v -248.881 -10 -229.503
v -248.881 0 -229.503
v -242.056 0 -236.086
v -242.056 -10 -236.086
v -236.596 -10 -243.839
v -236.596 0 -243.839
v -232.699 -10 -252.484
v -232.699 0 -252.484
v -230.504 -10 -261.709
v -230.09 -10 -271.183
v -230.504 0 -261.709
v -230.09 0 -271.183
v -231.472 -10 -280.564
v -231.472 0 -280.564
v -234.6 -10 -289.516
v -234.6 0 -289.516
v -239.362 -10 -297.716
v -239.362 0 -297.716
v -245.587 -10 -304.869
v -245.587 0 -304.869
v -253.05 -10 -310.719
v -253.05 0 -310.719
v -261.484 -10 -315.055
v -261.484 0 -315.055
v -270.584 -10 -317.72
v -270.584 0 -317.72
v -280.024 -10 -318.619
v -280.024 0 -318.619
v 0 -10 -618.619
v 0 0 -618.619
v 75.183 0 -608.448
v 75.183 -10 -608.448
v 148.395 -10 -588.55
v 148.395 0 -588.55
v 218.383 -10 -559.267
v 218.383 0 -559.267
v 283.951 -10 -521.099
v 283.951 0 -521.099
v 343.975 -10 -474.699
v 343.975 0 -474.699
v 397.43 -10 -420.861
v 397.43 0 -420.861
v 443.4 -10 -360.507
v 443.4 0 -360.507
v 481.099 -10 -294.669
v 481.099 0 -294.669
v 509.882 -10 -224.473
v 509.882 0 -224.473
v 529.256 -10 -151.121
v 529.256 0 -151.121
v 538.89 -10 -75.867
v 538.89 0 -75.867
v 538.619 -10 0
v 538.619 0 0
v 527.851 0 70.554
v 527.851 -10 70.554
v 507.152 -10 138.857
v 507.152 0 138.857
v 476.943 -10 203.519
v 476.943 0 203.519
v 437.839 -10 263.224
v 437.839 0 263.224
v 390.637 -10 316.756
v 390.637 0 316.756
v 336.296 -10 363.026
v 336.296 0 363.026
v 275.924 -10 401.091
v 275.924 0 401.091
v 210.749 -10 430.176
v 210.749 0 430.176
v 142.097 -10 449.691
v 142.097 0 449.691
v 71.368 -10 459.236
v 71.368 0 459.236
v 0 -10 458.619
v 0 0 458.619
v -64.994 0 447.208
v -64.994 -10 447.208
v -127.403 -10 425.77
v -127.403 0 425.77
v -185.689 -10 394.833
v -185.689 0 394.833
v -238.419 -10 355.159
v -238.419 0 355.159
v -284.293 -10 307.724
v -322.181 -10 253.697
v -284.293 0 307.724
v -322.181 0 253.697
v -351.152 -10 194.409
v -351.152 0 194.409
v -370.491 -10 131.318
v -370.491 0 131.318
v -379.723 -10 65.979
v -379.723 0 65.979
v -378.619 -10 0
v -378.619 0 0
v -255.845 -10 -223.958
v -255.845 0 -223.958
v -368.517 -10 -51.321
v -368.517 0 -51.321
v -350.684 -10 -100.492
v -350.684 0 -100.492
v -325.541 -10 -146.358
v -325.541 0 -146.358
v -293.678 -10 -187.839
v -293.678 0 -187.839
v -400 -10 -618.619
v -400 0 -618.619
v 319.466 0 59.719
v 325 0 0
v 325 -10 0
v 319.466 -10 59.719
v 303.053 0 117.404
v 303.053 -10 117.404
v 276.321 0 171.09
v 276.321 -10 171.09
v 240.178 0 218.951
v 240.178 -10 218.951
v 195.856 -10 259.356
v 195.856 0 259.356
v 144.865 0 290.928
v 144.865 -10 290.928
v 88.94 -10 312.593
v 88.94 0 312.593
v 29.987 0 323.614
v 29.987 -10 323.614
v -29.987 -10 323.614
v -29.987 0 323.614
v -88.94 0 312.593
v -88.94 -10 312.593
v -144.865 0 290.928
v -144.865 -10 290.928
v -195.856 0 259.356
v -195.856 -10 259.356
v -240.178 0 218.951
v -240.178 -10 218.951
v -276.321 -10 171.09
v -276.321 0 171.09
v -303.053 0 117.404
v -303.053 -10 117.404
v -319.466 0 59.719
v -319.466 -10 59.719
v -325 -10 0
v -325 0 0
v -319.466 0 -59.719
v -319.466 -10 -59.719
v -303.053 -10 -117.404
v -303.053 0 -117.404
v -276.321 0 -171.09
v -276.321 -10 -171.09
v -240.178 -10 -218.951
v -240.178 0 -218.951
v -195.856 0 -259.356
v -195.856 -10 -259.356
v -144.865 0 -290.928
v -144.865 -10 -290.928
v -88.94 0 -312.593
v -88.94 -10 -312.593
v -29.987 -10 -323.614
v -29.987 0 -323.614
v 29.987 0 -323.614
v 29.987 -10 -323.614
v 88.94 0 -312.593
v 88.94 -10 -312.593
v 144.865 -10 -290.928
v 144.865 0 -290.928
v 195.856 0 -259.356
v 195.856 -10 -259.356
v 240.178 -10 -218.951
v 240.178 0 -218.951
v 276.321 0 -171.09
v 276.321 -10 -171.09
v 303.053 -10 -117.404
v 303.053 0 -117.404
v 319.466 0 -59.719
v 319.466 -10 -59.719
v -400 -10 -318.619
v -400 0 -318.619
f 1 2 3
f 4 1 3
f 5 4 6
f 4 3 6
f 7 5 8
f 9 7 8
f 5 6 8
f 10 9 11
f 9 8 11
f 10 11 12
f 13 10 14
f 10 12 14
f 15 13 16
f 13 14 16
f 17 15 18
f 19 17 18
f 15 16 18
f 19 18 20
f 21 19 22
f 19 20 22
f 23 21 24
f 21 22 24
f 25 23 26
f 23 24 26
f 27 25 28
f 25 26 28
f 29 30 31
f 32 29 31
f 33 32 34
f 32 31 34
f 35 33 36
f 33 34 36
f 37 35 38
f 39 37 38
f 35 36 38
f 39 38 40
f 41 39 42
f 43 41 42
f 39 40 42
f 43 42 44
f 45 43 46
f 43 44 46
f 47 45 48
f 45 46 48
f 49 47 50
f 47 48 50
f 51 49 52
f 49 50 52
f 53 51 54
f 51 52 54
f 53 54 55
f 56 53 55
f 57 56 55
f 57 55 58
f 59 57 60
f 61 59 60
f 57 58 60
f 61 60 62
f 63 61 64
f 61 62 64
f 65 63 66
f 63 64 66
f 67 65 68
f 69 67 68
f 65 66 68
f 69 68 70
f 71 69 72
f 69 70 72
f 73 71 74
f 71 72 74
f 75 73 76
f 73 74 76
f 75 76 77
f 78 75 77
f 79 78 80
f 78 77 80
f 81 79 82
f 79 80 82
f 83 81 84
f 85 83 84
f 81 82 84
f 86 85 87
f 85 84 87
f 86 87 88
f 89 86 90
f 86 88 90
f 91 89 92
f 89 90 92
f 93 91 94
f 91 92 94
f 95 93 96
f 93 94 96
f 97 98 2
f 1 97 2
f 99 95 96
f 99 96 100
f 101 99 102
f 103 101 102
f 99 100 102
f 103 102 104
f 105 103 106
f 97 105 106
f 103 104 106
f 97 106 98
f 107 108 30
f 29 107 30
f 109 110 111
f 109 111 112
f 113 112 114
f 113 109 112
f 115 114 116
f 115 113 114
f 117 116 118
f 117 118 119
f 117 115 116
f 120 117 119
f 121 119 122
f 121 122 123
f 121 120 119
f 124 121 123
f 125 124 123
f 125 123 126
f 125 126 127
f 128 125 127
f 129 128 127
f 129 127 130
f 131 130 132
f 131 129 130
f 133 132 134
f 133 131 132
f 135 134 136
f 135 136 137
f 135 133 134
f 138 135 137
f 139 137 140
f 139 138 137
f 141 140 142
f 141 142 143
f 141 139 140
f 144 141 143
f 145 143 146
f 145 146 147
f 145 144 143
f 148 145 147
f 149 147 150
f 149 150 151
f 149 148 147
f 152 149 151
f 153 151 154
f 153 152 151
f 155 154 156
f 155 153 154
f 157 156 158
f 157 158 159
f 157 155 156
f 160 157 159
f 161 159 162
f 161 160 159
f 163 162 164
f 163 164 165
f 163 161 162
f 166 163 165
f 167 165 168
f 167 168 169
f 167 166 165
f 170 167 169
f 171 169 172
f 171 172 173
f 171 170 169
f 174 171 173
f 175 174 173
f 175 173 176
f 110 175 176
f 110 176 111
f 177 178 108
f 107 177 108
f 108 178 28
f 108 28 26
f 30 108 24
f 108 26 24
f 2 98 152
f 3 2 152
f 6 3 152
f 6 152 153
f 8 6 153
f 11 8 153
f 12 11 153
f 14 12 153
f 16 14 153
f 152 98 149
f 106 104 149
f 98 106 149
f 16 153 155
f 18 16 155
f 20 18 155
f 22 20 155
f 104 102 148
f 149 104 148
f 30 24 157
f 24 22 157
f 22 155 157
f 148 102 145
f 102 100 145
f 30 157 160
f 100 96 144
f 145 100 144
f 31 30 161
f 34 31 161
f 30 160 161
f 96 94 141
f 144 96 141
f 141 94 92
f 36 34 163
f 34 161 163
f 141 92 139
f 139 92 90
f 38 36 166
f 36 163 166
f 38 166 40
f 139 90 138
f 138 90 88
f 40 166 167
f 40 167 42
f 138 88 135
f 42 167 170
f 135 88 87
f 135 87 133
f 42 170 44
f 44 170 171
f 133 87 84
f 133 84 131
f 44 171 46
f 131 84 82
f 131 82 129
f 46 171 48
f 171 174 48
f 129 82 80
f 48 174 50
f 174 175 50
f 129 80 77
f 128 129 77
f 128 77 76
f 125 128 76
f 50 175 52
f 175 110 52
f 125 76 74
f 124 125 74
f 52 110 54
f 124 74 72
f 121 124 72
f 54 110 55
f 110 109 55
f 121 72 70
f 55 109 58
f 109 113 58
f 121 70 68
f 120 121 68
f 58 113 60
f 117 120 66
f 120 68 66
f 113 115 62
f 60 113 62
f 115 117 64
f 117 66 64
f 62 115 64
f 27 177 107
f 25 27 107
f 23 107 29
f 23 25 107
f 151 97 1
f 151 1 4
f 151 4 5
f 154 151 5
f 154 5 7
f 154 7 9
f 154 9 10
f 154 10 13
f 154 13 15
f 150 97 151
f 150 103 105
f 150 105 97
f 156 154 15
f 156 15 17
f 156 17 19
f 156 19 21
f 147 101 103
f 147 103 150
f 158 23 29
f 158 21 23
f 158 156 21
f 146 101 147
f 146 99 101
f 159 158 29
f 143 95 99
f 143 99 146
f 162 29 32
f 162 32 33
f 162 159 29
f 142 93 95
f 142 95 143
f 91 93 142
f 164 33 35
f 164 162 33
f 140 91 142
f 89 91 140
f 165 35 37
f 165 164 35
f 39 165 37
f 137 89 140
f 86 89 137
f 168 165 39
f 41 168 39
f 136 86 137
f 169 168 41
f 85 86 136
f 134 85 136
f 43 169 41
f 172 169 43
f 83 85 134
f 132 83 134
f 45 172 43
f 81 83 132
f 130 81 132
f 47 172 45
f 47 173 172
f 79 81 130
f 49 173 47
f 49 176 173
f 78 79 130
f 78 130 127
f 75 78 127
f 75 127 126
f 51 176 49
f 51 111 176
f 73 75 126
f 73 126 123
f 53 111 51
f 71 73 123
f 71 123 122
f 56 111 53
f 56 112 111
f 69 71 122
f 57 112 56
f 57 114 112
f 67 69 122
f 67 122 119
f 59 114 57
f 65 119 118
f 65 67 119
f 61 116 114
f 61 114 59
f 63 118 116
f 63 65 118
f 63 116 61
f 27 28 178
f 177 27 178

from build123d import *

# Parameters (mm, degrees)
F0_R     = 325
F1_DEPTH = 10


# Not quite as in the source:
# - a feature names something its author has since deleted; it is built from what else it names


with BuildPart() as f1:
    # F0 (on Front) → F1 (new body)
    with BuildSketch(Plane.XZ):
        with BuildLine():
            ThreePointArc((0, -618.6190456596), (397.429722157, -420.8611796621), (538.6190456596, 0))
            ThreePointArc((538.6190456596, 0), (364.2926371672, 340.8611796621), (0, 458.6190456596))
            ThreePointArc((0, 458.6190456596), (-284.2926371672, 307.7240946723), (-378.6190456596, 0))
            ThreePointArc((-378.6190456596, 0), (-338.9932719851, -123.9081492515), (-255.845498181, -223.9575325662))
            Line((-255.845498181, -223.9575325662), (-248.8807463186, -229.5026751274))
            ThreePointArc((-248.8807463186, -229.5026751274), (-232.823383589, -285.1142187928), (-280.0241173048, -318.6190456596))
            Line((-280.0241173048, -318.6190456596), (-400, -318.6190456596))
            Line((-400, -318.6190456596), (-400, -618.6190456596))
            Line((-400, -618.6190456596), (0, -618.6190456596))
        make_face()
        Circle(F0_R, mode=Mode.SUBTRACT)
    extrude(amount=F1_DEPTH)


solid = f1.part
